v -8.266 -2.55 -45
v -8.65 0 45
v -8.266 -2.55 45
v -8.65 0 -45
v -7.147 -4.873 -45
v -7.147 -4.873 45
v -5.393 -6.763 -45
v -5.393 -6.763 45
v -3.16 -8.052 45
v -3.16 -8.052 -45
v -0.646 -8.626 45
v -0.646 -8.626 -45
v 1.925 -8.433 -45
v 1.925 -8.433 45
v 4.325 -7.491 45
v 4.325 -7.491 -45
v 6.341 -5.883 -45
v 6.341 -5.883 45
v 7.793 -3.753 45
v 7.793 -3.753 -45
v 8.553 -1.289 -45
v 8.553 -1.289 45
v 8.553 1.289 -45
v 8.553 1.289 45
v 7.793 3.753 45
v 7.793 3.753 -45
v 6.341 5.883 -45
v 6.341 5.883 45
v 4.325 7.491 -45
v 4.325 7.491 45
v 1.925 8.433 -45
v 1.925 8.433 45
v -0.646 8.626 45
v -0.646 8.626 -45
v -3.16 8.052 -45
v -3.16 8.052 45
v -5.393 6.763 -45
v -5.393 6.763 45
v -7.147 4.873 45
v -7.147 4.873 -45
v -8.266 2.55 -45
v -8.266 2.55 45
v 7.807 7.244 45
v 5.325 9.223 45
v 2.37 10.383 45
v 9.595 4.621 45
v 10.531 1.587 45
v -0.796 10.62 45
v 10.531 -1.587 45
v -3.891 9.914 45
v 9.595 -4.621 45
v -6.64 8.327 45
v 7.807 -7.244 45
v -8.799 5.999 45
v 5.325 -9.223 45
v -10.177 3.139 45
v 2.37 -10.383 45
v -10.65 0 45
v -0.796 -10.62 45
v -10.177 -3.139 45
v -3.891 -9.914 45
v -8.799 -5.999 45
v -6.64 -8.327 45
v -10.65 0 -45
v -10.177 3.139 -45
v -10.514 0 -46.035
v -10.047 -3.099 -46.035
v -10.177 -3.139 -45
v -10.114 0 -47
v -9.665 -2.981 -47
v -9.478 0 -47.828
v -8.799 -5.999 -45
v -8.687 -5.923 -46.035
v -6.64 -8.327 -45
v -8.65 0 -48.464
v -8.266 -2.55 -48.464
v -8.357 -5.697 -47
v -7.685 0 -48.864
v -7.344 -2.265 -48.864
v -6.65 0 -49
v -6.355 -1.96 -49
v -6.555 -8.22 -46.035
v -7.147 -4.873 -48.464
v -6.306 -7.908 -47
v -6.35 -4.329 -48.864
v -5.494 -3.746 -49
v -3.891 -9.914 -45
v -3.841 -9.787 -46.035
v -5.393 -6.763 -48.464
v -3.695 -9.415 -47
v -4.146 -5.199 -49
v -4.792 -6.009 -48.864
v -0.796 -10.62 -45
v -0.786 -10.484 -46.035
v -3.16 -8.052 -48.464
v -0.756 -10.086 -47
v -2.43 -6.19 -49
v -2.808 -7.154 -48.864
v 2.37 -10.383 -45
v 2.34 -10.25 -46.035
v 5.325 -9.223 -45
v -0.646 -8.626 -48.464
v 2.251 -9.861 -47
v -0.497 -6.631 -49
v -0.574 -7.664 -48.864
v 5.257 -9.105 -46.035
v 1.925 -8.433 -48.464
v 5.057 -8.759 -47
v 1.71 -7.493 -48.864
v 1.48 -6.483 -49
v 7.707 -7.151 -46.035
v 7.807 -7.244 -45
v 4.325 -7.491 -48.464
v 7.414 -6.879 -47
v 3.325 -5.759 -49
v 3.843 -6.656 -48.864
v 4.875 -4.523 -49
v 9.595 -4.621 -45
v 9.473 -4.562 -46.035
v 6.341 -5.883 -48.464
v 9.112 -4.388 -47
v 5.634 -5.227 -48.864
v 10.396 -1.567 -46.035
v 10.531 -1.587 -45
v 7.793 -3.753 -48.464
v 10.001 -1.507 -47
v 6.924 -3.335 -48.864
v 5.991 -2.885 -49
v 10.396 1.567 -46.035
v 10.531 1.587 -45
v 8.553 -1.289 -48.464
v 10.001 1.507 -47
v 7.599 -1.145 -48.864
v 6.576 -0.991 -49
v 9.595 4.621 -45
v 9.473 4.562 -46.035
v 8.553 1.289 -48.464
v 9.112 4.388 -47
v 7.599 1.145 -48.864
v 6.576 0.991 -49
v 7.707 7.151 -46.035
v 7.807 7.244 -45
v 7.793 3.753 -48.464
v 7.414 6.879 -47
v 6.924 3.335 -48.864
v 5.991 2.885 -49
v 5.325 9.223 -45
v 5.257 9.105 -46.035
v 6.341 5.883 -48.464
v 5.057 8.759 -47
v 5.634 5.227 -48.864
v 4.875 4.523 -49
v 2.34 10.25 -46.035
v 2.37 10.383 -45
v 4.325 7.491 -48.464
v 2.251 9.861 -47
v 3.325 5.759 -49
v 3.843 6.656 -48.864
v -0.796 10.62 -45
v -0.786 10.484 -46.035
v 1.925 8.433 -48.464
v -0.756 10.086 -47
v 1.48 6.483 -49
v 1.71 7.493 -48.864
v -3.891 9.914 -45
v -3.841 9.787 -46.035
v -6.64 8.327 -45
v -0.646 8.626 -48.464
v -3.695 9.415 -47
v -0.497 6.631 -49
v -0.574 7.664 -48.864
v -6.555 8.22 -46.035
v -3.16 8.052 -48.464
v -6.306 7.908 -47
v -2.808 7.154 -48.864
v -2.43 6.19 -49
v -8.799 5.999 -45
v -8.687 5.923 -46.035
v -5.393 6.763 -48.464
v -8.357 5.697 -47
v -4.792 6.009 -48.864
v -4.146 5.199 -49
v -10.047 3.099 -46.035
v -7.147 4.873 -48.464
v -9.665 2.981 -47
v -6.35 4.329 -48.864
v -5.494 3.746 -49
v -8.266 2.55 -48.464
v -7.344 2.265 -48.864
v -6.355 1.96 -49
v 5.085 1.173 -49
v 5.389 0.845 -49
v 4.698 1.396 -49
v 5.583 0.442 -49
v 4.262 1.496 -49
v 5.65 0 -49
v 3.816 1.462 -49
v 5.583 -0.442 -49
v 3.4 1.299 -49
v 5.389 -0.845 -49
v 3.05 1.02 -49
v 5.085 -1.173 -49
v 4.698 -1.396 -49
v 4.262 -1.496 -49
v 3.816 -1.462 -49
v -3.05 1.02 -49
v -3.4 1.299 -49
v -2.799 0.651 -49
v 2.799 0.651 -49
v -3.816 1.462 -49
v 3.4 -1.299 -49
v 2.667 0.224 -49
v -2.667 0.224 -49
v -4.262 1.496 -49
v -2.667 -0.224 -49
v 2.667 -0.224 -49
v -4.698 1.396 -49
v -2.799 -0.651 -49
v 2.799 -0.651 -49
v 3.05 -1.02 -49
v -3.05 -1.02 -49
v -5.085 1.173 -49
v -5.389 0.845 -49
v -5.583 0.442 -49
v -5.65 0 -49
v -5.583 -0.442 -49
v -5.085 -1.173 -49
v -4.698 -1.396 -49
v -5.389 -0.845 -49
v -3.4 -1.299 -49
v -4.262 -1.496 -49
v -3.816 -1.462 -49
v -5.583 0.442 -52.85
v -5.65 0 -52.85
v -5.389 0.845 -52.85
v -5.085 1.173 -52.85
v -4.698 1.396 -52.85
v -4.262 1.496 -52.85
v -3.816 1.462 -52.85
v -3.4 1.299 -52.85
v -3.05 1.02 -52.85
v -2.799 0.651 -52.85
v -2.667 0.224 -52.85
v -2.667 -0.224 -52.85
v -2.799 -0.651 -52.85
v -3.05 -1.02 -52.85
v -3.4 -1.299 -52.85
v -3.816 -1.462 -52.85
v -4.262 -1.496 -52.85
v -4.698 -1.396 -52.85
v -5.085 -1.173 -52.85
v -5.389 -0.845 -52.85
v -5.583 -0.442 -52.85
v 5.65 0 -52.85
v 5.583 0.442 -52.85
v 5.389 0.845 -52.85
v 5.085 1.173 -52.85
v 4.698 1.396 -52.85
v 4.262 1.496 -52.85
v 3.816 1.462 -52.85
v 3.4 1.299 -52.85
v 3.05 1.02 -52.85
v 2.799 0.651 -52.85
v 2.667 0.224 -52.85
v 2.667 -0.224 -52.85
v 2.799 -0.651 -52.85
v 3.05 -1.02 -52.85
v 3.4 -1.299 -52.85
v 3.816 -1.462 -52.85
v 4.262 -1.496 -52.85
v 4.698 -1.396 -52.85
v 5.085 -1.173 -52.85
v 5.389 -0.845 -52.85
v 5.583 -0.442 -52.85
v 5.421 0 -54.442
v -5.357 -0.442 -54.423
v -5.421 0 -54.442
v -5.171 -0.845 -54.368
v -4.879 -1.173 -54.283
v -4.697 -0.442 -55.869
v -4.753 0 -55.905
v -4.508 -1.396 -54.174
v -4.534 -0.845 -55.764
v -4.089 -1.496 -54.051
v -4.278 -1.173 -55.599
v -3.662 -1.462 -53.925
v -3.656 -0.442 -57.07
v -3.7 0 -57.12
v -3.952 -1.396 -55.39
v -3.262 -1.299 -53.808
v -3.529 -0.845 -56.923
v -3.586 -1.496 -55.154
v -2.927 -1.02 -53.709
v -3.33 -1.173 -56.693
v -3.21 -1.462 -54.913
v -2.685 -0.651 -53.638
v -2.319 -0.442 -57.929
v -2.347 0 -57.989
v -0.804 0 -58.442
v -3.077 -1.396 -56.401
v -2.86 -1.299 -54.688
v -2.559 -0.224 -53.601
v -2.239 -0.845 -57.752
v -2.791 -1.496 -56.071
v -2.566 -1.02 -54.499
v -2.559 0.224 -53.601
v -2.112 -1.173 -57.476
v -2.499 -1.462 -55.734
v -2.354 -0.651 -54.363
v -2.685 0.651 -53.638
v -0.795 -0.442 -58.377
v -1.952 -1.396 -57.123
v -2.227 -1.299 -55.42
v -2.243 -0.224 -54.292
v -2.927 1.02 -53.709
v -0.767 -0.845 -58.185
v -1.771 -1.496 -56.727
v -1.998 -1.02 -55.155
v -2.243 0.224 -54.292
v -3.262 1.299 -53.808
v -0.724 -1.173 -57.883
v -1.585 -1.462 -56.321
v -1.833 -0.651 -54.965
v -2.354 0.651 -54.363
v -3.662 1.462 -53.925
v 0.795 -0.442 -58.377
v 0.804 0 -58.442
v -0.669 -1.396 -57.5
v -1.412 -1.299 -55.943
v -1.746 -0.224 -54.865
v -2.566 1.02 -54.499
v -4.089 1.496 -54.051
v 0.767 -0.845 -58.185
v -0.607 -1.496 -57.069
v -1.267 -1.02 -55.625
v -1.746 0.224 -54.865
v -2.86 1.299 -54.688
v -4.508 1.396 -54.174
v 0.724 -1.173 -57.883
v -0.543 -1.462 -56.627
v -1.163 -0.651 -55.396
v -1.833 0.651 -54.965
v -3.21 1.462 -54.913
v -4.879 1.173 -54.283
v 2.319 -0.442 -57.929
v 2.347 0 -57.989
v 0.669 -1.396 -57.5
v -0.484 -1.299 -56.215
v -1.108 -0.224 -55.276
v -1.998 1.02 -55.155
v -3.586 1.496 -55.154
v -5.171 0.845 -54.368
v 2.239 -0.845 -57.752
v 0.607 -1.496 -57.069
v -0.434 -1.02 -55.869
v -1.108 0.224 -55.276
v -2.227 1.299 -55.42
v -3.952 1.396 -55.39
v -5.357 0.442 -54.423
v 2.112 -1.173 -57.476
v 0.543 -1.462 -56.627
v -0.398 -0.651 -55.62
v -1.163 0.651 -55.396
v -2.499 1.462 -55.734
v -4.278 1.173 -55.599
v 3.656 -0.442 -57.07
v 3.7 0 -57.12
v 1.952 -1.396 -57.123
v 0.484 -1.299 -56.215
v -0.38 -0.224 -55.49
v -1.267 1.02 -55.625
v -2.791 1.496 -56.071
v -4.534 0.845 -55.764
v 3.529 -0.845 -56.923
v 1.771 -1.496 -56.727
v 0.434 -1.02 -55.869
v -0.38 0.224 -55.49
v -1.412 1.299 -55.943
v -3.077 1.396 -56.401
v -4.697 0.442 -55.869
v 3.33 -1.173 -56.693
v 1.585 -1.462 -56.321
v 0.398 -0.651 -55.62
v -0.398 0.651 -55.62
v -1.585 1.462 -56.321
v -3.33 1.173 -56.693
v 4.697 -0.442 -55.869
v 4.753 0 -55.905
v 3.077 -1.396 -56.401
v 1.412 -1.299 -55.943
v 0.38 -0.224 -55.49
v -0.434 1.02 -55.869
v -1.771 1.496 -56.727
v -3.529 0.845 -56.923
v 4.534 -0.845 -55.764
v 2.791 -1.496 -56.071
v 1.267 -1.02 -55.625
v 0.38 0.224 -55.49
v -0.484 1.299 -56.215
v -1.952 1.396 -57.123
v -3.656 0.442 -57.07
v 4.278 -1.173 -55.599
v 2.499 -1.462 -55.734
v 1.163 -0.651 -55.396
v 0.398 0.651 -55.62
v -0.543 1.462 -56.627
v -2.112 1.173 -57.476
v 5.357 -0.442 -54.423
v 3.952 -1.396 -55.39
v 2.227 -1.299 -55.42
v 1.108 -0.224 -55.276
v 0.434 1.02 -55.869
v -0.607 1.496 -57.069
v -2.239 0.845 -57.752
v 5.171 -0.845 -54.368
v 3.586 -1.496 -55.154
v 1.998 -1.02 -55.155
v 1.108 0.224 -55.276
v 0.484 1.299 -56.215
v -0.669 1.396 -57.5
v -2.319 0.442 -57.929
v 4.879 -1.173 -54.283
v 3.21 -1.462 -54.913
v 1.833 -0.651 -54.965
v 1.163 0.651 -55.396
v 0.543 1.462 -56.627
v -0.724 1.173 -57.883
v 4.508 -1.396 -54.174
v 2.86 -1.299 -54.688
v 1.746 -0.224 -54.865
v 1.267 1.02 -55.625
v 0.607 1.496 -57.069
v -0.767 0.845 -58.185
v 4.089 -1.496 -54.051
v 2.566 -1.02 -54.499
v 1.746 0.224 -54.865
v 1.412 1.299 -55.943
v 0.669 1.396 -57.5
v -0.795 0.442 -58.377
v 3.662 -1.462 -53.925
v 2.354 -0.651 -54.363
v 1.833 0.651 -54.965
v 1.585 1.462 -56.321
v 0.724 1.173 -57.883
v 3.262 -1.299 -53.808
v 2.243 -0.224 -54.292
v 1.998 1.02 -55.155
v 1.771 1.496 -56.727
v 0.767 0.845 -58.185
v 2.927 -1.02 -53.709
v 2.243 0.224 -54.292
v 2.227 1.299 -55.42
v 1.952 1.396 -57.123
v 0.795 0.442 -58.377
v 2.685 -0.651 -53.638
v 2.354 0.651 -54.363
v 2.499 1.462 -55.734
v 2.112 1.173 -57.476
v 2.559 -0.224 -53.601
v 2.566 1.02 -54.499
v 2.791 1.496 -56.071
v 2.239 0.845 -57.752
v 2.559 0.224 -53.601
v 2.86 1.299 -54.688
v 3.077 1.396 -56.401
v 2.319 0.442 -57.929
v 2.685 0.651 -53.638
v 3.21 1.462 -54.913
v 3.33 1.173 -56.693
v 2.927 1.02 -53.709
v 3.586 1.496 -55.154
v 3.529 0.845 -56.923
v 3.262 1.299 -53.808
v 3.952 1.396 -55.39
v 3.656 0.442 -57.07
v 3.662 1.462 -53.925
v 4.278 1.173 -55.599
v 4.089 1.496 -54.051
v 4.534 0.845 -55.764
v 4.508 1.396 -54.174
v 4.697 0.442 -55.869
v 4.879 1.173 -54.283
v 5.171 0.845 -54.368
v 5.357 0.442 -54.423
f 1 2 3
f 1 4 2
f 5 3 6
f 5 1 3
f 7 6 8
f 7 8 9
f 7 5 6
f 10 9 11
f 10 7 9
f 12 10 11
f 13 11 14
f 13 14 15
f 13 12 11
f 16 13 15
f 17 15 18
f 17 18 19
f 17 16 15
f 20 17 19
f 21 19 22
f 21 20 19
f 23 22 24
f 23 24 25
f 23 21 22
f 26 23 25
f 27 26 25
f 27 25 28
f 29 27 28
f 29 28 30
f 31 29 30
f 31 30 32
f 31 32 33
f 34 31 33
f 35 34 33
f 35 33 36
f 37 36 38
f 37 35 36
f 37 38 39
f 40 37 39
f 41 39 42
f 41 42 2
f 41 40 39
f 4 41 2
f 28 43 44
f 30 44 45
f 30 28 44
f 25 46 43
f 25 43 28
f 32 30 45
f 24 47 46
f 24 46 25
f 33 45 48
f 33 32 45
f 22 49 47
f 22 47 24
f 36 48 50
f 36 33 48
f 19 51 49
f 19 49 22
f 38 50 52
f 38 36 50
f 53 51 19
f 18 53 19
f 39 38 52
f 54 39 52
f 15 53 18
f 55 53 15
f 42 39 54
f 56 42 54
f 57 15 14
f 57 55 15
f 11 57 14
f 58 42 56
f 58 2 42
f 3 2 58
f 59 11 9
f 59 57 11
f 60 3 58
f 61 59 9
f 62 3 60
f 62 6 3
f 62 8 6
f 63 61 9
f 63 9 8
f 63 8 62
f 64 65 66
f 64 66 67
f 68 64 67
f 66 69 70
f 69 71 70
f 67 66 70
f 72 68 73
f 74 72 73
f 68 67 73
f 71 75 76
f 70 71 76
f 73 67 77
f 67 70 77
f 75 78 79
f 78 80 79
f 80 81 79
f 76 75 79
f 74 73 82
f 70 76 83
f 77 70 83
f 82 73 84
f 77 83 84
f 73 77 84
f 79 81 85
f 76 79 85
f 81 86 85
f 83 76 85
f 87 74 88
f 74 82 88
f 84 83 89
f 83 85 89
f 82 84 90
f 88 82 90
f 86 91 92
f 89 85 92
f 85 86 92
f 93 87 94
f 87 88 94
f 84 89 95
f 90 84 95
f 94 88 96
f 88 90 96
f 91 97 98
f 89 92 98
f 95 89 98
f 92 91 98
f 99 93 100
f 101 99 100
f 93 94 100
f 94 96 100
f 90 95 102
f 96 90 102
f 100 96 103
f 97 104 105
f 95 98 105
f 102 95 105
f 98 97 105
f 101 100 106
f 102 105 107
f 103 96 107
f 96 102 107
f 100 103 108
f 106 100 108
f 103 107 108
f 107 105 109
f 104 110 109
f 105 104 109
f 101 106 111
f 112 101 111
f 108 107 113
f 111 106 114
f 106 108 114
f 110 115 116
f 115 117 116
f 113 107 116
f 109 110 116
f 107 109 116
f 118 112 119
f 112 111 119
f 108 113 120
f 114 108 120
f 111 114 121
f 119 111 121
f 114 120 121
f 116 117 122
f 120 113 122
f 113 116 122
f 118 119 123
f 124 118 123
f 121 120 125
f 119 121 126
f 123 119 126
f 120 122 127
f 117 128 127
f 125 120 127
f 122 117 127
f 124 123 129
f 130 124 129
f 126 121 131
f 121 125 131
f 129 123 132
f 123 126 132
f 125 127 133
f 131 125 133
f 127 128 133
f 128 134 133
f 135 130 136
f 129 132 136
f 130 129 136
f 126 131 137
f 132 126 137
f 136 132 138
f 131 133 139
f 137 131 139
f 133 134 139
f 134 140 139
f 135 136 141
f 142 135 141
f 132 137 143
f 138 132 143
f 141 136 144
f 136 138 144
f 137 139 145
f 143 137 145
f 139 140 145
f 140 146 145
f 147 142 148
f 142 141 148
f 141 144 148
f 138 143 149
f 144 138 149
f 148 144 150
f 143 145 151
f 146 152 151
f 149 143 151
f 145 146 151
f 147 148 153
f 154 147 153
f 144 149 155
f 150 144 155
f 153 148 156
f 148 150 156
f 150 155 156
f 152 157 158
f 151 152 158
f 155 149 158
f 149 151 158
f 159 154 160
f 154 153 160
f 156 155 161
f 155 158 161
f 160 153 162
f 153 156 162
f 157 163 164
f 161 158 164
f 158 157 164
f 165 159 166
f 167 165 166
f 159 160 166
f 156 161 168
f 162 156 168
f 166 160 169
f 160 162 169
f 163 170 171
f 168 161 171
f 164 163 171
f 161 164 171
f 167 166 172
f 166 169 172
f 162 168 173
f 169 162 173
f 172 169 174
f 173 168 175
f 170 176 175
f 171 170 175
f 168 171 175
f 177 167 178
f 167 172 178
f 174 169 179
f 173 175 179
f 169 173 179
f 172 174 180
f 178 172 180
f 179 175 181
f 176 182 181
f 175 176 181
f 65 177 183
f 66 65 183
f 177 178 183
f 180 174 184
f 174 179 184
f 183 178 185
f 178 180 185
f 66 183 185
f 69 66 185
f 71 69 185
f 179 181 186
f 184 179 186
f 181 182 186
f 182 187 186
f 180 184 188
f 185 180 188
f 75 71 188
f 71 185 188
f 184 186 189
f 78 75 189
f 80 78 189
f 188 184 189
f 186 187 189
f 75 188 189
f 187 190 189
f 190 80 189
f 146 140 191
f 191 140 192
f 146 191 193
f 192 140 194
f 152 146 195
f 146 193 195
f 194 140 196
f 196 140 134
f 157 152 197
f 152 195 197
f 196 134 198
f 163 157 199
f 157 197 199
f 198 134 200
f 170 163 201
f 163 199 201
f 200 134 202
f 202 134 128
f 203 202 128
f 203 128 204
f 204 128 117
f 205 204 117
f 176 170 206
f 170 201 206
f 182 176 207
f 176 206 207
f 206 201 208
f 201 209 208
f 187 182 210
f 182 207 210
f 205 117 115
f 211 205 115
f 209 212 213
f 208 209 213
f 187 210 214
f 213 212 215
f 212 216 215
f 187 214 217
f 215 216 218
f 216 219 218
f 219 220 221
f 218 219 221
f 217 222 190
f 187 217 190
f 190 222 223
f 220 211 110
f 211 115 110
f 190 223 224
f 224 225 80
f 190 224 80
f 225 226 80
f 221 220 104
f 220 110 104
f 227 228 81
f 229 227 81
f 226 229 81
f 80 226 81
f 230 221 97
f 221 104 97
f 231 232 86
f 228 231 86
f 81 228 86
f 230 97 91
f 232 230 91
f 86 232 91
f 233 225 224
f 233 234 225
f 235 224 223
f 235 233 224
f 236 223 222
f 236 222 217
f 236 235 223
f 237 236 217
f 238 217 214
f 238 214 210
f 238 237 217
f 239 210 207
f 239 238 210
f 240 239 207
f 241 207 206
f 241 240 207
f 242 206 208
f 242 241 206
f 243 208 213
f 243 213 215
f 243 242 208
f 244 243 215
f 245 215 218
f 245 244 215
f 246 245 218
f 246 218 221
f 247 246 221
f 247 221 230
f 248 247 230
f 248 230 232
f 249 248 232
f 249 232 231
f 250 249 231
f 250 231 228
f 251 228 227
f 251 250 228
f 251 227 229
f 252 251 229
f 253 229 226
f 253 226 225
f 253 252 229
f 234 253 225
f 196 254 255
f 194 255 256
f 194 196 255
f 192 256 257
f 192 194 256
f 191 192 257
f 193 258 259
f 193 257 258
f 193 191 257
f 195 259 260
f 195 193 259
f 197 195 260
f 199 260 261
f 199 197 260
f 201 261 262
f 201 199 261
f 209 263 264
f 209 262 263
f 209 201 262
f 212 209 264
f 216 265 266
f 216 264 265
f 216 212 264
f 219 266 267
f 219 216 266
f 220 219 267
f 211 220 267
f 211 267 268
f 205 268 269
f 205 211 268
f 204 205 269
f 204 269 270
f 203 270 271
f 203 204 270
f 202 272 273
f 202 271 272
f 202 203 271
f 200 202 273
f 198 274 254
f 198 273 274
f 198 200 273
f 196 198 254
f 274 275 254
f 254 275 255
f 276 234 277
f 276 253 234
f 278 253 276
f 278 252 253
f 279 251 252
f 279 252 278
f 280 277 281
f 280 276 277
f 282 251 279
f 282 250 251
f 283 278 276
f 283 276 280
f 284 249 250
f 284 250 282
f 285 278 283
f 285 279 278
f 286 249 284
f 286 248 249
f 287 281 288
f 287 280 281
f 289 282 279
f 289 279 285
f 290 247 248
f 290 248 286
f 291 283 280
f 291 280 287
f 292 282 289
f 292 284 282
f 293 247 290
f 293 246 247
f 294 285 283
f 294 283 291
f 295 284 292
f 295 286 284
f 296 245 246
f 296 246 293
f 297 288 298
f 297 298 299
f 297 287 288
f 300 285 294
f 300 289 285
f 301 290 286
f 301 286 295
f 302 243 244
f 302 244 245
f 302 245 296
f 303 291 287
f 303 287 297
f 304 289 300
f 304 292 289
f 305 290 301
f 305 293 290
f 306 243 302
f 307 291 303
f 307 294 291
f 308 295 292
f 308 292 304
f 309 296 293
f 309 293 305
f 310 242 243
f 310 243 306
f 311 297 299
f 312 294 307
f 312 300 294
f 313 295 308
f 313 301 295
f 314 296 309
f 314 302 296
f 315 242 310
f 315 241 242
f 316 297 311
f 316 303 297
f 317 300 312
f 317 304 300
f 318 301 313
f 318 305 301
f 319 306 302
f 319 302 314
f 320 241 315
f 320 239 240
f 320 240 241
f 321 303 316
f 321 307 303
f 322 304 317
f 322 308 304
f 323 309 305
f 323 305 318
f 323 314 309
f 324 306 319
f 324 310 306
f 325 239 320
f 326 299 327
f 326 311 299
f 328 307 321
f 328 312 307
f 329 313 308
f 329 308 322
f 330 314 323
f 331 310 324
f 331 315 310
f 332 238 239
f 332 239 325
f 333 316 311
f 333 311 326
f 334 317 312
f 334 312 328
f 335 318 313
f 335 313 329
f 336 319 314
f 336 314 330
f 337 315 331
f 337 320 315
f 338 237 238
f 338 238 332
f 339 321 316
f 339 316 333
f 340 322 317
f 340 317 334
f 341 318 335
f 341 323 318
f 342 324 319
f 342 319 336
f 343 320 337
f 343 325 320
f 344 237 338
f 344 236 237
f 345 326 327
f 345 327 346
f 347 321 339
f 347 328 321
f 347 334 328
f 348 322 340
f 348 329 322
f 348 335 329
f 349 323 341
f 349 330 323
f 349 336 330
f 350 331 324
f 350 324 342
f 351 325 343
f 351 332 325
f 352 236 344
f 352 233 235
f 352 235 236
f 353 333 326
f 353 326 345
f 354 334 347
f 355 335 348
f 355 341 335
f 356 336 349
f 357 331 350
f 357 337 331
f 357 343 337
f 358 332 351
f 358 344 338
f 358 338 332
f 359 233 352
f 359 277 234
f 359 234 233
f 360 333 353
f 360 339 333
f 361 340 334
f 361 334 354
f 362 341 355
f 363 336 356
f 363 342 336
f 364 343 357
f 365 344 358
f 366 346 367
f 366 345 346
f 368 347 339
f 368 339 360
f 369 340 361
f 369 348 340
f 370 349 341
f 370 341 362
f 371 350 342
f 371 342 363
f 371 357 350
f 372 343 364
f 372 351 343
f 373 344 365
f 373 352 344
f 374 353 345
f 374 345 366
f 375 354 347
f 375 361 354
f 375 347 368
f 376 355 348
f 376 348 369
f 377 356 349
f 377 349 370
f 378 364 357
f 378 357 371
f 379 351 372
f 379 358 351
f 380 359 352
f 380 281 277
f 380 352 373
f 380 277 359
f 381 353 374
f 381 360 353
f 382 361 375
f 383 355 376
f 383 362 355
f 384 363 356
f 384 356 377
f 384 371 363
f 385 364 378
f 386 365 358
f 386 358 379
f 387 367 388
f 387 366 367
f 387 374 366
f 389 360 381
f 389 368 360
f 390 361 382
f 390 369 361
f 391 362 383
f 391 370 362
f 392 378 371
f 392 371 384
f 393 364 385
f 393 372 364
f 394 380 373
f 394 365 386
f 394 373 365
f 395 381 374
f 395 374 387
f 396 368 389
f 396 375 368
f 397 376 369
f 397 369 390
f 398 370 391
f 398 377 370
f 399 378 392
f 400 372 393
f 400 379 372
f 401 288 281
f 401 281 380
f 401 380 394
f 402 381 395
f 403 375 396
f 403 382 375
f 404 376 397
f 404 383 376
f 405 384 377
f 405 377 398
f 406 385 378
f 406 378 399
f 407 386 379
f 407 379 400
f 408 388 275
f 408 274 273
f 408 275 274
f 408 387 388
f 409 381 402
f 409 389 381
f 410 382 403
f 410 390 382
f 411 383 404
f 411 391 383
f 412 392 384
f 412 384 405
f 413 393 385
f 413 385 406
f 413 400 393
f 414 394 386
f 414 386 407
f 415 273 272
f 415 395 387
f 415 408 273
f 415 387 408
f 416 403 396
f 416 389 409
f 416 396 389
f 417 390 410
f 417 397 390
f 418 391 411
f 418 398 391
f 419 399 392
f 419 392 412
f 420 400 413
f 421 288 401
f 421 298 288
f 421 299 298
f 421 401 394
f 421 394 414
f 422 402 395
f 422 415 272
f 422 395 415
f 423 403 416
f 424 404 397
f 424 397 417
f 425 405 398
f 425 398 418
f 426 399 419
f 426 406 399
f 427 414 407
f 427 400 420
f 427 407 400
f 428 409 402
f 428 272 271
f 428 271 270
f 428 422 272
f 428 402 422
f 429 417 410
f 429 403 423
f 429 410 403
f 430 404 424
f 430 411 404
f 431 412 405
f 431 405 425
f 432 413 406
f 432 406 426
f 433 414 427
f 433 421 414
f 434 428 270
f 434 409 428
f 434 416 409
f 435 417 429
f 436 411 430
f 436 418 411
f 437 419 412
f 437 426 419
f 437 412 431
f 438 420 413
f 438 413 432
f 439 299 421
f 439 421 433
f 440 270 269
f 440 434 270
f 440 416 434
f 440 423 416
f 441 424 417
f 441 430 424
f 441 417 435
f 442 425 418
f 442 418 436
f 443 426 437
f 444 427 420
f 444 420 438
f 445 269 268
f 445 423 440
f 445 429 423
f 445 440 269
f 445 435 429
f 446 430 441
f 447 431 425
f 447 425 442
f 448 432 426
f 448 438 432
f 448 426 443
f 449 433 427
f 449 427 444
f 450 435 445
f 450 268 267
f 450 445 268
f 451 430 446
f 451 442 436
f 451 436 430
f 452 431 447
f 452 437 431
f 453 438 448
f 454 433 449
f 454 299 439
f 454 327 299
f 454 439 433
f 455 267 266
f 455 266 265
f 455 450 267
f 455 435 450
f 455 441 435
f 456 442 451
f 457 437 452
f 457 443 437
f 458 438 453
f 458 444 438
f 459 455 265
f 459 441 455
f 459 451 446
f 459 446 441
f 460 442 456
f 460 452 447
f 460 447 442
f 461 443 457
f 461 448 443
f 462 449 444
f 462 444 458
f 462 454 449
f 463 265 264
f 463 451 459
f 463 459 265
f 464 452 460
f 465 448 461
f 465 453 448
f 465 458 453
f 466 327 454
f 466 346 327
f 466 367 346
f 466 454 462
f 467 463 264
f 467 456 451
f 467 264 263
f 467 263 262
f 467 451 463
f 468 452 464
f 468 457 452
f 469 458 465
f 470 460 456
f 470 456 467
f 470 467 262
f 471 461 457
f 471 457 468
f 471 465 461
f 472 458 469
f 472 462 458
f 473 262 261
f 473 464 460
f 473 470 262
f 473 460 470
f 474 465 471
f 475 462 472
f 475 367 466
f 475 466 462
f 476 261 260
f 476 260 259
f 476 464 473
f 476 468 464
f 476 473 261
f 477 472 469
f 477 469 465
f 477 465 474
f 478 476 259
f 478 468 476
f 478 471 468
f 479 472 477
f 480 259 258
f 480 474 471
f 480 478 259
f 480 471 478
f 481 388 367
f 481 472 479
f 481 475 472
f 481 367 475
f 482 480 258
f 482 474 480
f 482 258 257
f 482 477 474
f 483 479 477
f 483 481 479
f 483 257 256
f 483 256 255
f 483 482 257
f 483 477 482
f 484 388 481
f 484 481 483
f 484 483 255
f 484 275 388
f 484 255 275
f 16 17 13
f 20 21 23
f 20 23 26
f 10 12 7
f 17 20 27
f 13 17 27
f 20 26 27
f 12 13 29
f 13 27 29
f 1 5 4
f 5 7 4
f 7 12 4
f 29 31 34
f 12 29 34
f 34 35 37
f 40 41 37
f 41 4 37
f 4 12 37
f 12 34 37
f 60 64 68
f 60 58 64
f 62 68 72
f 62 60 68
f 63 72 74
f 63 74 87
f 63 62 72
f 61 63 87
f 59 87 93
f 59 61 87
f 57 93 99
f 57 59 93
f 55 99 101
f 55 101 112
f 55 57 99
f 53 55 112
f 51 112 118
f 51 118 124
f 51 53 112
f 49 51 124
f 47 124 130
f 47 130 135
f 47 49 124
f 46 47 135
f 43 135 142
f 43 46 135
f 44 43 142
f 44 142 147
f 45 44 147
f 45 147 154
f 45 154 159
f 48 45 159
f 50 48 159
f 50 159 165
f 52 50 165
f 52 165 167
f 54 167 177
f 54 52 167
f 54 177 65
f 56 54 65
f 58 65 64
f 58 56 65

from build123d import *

# Parameters (mm, degrees)
ESQUISSE2_R        = 10.65
ESQUISSE2_R_2      = 8.65
BOSS_EXTRU_1_DEPTH = 45
ESQUISSE5_R        = 1.5


with BuildPart() as part:
    # Esquisse2 → Boss.-Extru.1 (new, symmetric)
    with BuildSketch(Plane.XY):
        with Locations(Location((0, 0, 0), (0, 0, 180))):
            Circle(ESQUISSE2_R)
        with Locations(Location((0, 0, 0), (0, 0, 180))):
            Circle(ESQUISSE2_R_2, mode=Mode.SUBTRACT)
    extrude(amount=BOSS_EXTRU_1_DEPTH, both=True)

    # Esquisse3 → Révolution1 (revolve)
    with BuildSketch(Plane(origin=(0, 0, 0), x_dir=(1, 0, 0), z_dir=(0, 1, 0))):
        with BuildLine():
            Line((-6.65, 49), (0, 49))
            Line((0, 49), (0, 45))
            Line((0, 45), (-10.65, 45))
            ThreePointArc((-10.65, 45), (-9.478427125, 47.828427125), (-6.65, 49))
        make_face()
    revolve(axis=Axis((0, 0, -49), (0, 0, 1)))

    # Balayage3: sweep along a path in Esquisse6
    with BuildLine(Plane(origin=(0, 0, 0), x_dir=(1, 0, 0), z_dir=(0, 1, 0))) as balayage3_path:
        Line((-2.65, 45), (-2.65, 52.85))
        ThreePointArc((-2.65, 52.85), (0, 55.5), (2.65, 52.85))
        Line((2.65, 52.85), (2.65, 45))
    # Esquisse5 → Balayage3 (sweep)
    with BuildSketch(Plane(origin=(0, 0, 0), x_dir=(0, 0, -1), z_dir=(1, 0, 0))):
        with Locations((57, 0)):
            Circle(ESQUISSE5_R)
    sweep(path=balayage3_path.line)


solid = part.part
